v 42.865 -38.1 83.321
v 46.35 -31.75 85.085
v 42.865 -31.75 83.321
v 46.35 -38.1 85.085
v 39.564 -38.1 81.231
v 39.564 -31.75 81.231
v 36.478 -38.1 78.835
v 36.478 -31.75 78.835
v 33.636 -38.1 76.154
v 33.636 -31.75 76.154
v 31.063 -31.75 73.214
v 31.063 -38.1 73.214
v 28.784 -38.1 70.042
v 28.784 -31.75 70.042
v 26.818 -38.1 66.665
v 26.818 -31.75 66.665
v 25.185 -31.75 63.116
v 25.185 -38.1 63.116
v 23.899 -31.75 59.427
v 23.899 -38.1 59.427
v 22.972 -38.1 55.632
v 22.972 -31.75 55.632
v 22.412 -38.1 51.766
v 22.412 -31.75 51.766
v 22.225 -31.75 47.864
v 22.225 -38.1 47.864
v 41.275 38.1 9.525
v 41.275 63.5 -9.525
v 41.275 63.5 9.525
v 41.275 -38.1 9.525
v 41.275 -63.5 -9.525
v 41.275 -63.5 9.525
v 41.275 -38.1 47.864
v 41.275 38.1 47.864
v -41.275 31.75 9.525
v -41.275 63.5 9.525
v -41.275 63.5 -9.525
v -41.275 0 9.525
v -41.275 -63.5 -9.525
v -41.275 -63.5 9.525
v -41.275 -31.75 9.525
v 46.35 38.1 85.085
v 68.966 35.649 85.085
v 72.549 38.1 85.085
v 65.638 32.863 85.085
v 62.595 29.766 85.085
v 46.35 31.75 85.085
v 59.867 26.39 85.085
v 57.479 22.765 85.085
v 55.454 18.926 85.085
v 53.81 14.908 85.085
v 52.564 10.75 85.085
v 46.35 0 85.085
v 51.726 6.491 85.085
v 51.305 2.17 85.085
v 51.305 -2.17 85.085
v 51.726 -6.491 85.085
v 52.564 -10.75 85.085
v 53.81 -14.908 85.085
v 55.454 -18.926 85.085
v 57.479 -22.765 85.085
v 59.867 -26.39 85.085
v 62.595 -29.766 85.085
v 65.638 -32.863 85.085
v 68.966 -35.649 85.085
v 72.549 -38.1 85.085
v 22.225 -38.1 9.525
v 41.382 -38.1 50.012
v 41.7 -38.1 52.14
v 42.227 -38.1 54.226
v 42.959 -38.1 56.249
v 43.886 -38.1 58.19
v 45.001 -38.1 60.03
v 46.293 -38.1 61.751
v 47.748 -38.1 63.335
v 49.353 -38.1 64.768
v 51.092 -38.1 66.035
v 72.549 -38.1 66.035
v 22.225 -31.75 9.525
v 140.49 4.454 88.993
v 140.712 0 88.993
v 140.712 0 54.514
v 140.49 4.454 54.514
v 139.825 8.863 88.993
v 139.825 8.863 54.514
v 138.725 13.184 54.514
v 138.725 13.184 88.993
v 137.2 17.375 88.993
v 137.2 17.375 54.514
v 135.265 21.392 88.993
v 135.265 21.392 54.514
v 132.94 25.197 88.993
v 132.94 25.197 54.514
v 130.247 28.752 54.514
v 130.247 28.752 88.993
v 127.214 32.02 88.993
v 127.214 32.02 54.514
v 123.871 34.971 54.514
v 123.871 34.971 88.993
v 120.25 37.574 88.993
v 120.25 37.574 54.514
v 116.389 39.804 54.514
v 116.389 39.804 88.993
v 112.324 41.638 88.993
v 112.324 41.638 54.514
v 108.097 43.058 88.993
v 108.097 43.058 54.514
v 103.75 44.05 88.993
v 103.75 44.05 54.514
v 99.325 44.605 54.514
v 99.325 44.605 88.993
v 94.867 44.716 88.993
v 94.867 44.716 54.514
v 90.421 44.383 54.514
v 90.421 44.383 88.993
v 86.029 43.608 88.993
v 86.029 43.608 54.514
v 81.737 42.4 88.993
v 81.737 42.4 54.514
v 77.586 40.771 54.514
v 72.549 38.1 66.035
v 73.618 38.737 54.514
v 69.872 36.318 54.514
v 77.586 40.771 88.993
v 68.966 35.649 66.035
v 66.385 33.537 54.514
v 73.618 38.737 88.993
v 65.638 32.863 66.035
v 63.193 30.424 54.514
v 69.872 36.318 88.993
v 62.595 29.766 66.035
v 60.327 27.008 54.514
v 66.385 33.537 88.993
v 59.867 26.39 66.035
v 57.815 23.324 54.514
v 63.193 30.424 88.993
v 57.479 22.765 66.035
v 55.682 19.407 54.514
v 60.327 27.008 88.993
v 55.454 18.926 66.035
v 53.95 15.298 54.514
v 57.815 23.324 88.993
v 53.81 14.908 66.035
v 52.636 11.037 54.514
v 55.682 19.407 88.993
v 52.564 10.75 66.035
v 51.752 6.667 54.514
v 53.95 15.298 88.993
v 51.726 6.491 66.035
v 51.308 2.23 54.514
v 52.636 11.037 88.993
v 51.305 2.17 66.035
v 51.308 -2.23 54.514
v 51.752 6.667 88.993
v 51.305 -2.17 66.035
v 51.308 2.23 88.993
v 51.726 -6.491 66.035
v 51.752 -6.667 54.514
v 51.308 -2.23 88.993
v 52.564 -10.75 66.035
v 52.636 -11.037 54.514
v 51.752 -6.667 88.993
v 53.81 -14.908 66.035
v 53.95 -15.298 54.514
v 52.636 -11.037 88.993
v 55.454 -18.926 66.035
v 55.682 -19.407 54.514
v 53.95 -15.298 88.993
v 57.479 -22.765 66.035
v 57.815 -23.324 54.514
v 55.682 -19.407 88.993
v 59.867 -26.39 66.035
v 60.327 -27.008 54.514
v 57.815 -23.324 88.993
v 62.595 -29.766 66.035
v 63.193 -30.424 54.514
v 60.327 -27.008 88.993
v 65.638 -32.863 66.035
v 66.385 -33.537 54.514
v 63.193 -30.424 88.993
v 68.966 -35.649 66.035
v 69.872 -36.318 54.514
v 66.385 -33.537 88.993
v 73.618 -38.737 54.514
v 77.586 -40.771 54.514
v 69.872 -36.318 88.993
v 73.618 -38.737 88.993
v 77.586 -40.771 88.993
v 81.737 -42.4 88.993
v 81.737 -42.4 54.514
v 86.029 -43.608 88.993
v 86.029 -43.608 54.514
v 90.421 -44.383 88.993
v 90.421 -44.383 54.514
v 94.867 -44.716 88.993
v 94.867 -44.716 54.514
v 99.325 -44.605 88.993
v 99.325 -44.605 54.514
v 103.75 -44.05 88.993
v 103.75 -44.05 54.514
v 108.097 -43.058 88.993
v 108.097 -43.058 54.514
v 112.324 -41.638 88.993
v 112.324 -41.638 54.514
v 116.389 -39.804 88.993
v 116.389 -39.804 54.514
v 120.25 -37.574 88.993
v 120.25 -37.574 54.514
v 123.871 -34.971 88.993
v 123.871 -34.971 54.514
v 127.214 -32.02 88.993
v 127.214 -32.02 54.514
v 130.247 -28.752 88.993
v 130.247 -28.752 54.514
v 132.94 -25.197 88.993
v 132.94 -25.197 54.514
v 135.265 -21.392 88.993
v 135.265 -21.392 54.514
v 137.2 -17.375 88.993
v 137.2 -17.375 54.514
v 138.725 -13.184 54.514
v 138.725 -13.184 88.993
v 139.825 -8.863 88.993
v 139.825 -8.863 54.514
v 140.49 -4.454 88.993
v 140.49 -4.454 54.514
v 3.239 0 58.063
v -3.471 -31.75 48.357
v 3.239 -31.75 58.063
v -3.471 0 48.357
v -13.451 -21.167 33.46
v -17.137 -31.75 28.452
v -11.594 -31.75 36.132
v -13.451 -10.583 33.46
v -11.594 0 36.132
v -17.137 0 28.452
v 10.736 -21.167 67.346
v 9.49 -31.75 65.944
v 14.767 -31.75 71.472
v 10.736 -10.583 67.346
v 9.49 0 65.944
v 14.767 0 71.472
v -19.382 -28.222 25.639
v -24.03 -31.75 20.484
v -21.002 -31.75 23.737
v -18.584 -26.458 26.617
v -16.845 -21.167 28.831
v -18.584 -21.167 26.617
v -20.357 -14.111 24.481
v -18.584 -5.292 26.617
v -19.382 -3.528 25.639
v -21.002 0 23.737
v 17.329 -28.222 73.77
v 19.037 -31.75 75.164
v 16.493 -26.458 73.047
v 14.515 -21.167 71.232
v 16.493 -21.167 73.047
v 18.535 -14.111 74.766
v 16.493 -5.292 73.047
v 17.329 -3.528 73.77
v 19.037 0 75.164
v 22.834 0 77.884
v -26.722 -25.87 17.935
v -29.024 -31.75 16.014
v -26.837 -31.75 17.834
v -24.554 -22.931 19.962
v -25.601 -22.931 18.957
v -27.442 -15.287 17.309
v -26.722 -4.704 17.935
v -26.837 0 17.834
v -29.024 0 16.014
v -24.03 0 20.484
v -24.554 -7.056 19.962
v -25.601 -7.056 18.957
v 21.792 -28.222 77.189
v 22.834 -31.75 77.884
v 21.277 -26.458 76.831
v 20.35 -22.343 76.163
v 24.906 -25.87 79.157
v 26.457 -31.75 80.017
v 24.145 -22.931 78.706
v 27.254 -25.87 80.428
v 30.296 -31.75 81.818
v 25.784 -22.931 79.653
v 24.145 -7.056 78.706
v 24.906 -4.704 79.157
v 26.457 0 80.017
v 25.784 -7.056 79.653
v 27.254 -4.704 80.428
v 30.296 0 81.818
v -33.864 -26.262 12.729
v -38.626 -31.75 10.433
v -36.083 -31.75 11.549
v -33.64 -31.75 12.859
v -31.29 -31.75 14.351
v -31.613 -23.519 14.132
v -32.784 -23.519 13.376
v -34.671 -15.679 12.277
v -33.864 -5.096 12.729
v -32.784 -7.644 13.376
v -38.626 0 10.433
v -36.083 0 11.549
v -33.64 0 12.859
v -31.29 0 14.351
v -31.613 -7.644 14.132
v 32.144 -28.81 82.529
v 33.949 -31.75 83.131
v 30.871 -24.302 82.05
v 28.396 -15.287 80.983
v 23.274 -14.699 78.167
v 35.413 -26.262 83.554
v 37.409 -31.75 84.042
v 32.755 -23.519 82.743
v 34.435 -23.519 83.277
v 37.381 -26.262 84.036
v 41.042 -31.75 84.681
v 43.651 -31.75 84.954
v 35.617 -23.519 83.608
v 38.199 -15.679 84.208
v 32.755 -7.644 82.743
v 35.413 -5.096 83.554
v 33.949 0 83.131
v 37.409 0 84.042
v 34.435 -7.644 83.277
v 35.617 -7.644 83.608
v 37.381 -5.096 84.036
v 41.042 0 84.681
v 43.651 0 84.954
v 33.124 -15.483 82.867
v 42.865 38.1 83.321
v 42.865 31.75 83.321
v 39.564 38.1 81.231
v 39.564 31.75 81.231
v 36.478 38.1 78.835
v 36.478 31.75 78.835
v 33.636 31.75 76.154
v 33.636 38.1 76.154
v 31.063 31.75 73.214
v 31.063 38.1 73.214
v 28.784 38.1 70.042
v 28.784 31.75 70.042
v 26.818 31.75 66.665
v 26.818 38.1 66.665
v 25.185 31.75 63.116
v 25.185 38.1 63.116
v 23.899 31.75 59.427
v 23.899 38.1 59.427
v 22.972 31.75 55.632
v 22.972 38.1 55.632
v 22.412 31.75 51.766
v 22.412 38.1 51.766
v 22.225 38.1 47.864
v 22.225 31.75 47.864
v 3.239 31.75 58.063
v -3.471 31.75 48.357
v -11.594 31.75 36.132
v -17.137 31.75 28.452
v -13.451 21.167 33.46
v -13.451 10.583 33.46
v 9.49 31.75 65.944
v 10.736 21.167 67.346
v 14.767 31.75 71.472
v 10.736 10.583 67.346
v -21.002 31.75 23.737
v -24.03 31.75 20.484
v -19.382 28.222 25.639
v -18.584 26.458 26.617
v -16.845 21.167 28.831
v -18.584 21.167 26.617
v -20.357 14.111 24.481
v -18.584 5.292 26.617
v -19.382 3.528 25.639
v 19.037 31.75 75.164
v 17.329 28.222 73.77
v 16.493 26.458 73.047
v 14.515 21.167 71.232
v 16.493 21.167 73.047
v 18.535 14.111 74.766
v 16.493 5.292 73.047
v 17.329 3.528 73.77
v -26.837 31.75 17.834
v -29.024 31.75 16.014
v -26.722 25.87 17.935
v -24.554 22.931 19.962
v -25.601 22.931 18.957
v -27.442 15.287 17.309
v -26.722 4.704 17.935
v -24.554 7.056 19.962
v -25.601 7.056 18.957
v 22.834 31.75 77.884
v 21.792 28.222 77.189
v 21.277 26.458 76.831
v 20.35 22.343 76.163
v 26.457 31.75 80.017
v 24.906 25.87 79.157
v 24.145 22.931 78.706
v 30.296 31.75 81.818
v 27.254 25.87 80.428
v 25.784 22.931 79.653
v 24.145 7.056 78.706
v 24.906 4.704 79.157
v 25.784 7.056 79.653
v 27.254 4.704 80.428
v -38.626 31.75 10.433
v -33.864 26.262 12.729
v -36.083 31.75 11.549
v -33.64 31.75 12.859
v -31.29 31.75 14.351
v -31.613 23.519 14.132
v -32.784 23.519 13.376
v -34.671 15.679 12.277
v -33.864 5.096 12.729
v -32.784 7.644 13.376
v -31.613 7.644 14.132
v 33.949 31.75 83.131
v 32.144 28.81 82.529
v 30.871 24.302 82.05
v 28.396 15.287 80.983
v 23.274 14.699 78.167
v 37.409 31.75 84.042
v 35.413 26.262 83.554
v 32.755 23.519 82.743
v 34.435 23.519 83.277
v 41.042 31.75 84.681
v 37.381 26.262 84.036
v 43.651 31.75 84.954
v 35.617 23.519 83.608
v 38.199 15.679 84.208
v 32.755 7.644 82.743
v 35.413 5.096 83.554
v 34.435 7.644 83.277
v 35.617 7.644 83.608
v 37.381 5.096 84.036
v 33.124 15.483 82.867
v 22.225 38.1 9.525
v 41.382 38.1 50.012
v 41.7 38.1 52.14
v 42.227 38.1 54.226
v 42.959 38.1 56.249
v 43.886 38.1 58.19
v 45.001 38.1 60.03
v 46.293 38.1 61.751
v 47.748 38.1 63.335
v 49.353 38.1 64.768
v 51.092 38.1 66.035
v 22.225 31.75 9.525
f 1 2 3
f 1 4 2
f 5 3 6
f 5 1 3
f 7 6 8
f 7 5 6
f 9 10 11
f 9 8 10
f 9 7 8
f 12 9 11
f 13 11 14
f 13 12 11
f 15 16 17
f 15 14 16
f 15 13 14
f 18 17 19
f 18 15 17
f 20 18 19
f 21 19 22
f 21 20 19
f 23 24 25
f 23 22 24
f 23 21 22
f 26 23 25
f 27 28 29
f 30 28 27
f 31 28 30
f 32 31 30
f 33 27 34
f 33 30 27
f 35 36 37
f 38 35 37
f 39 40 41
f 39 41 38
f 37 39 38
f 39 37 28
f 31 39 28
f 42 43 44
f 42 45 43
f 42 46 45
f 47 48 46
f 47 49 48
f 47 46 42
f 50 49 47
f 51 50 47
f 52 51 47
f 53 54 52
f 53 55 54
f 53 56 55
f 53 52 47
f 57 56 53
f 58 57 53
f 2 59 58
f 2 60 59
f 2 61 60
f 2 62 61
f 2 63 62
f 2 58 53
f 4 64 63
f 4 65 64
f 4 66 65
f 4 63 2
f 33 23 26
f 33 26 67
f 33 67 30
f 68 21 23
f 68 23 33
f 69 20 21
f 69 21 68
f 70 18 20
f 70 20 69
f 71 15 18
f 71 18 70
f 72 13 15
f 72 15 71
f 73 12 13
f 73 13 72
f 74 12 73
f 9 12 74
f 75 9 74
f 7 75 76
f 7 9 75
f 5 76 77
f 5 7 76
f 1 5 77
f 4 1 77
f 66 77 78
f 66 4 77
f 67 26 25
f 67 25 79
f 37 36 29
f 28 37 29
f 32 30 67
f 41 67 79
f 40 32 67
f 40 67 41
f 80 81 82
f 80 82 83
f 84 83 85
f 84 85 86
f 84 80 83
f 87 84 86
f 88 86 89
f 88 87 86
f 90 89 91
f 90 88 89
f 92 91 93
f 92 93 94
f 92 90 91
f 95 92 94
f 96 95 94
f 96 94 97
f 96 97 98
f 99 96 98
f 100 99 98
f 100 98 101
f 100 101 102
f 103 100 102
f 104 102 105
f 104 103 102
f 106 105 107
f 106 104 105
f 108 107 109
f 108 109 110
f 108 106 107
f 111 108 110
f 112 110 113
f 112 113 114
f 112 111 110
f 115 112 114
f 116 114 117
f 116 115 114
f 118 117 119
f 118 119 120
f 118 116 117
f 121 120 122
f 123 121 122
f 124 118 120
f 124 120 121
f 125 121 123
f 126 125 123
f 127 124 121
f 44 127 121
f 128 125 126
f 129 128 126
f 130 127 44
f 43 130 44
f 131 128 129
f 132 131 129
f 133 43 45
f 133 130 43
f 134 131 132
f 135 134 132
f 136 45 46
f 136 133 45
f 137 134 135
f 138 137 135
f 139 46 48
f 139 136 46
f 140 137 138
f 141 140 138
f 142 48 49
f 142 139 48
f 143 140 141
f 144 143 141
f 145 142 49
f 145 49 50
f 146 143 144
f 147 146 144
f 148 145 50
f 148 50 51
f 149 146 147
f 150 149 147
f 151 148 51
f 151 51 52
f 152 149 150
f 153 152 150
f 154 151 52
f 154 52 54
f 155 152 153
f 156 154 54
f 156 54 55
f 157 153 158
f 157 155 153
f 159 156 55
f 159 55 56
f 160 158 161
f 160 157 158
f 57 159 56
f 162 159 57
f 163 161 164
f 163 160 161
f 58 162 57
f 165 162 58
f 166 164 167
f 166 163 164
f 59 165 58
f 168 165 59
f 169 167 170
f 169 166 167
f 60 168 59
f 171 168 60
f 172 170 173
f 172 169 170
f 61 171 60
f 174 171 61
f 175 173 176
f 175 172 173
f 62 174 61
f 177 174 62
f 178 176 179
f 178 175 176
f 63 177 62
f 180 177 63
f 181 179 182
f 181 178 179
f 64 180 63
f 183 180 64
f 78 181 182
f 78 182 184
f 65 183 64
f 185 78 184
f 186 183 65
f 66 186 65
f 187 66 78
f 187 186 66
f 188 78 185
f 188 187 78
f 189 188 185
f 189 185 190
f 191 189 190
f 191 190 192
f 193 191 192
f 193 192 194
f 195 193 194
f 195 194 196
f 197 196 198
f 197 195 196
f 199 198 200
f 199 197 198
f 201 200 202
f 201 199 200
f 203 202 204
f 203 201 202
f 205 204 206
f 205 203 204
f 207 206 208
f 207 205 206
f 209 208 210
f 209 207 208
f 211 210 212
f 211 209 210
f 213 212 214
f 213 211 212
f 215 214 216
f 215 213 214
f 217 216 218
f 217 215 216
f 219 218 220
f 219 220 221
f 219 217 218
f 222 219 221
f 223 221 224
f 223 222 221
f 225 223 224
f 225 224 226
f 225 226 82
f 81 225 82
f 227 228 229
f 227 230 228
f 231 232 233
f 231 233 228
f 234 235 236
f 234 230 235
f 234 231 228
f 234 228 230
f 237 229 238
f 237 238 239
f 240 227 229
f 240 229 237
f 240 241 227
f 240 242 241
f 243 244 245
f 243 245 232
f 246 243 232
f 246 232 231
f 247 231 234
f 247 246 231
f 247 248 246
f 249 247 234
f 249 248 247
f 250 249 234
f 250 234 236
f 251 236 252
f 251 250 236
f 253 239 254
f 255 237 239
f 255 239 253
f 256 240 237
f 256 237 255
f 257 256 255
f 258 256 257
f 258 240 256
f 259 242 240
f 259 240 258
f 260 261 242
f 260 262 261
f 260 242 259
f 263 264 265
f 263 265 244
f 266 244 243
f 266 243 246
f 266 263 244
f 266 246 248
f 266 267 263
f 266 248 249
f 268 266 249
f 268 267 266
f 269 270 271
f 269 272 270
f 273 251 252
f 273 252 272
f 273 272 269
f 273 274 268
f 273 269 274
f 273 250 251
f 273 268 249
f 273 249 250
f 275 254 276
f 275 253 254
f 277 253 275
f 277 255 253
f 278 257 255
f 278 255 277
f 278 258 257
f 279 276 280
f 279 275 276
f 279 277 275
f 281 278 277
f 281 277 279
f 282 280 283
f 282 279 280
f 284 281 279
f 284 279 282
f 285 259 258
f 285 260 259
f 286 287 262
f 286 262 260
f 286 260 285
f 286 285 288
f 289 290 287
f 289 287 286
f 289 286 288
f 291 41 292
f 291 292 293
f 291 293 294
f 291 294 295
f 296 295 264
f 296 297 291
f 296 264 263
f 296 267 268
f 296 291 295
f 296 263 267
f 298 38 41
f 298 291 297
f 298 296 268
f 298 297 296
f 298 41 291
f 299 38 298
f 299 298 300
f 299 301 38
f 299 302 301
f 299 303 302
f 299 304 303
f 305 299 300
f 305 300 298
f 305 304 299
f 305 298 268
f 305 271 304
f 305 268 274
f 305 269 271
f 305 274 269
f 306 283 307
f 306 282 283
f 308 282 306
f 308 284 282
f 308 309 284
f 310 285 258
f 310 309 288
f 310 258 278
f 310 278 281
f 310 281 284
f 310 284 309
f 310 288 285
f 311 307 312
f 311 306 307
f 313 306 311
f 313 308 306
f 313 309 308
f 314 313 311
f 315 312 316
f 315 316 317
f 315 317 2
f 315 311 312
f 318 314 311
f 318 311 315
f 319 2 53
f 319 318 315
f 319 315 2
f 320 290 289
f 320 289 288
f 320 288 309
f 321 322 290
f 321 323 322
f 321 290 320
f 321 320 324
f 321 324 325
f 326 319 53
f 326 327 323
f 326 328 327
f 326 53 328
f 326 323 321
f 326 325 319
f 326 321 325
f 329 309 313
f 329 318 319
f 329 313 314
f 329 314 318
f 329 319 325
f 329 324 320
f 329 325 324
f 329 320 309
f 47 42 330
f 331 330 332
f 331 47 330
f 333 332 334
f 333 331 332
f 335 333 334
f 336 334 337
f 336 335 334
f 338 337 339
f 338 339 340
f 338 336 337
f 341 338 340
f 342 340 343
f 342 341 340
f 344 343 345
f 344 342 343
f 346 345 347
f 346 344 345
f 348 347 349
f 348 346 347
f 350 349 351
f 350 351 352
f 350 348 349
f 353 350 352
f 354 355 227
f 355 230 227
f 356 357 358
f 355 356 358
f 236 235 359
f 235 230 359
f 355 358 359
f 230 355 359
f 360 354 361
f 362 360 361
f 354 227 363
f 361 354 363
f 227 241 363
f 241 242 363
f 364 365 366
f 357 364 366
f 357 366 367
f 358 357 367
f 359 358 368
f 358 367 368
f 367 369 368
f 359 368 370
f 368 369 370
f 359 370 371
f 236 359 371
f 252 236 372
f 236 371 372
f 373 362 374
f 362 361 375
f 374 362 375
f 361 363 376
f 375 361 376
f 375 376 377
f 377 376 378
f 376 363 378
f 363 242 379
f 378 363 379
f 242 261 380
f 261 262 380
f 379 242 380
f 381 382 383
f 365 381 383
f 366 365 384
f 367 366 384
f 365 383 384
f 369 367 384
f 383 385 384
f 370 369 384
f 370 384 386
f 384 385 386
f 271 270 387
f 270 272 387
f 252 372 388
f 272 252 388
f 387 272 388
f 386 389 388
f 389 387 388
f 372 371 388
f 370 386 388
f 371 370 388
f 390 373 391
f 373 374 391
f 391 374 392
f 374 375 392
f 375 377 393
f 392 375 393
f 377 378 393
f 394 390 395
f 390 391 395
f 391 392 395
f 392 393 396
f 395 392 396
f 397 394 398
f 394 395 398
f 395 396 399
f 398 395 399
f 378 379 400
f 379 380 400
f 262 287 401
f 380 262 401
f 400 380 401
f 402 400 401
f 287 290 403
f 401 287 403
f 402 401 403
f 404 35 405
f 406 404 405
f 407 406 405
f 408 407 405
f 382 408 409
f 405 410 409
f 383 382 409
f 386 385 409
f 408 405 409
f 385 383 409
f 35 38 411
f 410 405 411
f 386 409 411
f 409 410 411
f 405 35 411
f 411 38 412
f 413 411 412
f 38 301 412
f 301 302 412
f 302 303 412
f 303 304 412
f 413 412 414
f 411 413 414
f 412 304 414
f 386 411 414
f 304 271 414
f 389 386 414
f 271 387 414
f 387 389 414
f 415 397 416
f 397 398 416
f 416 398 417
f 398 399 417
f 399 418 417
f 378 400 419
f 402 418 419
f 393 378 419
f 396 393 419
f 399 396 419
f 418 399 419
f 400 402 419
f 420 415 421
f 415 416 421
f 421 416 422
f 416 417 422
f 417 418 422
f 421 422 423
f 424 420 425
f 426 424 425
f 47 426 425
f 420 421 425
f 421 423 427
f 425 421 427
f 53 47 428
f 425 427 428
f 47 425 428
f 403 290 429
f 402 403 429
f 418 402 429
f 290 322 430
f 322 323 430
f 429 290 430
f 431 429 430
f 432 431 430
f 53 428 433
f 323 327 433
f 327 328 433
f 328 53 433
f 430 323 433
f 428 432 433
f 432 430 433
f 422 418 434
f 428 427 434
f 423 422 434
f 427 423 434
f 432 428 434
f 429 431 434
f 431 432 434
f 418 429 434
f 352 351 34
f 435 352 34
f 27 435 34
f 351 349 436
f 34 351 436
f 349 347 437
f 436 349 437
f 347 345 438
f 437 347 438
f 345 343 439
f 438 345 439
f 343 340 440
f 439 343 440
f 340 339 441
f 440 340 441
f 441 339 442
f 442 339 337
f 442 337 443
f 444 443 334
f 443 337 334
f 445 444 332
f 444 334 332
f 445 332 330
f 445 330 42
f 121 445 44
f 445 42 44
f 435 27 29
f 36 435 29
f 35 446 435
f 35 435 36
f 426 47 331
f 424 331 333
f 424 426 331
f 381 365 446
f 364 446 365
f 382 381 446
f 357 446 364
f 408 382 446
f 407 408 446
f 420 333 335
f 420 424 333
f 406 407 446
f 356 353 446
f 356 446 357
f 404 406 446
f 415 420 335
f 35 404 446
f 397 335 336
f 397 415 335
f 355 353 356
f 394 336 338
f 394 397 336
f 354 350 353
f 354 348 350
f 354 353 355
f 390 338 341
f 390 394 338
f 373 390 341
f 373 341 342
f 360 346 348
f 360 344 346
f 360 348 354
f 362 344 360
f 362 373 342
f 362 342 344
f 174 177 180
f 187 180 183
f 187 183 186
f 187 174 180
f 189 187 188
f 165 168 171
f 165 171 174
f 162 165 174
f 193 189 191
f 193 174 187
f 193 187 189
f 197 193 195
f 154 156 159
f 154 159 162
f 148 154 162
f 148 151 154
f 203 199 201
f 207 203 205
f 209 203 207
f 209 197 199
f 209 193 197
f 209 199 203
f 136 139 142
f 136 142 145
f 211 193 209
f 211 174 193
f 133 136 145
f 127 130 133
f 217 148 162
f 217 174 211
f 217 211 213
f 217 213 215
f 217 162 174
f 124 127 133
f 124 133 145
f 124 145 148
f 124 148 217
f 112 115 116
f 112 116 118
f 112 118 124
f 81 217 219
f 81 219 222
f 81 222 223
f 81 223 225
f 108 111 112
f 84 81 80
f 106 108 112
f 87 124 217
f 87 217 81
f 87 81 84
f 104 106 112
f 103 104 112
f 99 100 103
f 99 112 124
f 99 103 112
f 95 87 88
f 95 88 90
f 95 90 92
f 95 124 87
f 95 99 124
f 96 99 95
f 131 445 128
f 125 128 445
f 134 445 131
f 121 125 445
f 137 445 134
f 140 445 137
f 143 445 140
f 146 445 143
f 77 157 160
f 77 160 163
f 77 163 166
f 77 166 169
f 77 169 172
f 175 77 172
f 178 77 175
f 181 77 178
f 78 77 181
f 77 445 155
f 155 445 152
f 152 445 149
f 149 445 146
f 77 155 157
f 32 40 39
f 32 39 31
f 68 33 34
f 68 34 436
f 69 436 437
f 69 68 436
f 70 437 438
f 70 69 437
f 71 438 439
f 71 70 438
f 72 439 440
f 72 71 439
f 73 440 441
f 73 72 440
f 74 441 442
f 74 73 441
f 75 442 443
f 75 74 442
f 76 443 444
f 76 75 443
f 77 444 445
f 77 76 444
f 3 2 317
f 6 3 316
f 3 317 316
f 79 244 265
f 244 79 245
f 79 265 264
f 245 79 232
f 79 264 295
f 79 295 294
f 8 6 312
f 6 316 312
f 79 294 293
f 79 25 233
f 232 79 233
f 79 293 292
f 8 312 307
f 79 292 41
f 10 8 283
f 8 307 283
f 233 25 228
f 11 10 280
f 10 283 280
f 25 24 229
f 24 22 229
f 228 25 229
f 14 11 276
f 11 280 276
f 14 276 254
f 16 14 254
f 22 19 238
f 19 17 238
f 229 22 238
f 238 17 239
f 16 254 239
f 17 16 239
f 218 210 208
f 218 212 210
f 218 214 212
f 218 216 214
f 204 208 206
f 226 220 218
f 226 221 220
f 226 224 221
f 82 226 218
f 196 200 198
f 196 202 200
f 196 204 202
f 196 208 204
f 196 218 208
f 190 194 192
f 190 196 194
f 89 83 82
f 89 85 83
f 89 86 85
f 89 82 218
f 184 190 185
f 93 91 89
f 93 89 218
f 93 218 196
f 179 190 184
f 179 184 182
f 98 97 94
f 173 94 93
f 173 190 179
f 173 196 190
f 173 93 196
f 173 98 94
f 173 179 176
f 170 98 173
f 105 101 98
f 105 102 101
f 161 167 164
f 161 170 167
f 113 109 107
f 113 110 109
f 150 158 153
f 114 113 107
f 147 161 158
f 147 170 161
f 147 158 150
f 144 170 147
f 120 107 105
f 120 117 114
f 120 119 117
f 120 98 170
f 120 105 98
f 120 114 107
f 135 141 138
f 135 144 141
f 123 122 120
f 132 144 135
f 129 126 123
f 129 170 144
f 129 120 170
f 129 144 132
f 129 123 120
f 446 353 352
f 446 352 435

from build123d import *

# Parameters (mm, degrees)
F1_DEPTH = 63.5
F2_DEPTH = 38.1
F3_DEPTH = 31.75


with BuildPart() as f1:
    # F0 (on Front) → F1 (new body, symmetric)
    with BuildSketch(Plane.XZ):
        Polygon((22.225, 9.525), (-41.275, 9.525), (-41.275, -9.525), (41.275, -9.525), (41.275, 9.525), align=None)
    extrude(amount=F1_DEPTH, both=True)

    # F0 (on Front) → F2 (join, symmetric)
    with BuildSketch(Plane.XZ):
        with BuildLine():
            Line((22.225, 47.863565), (22.225, 9.525))
            Line((22.225, 9.525), (41.275, 9.525))
            Line((41.275, 9.525), (41.275, 47.863565))
            ThreePointArc((41.275, 47.863565), (43.886262, 58.190434), (51.092341, 66.034881))
            Line((51.092341, 66.034881), (95.982485, 66.034881))
            Line((95.982485, 66.034881), (95.982485, 85.084881))
            Line((95.982485, 85.084881), (46.350457, 85.084881))
            ThreePointArc((46.350457, 85.084881), (28.783869, 70.041618), (22.225, 47.863565))
        make_face()
    extrude(amount=F2_DEPTH, both=True)

    # F0 (on Front) → F3 (join, symmetric)
    with BuildSketch(Plane.XZ):
        with BuildLine():
            add(Edge.make_bspline(
                [(-41.275, 9.525), (-6.610331, 19.785214), (0, 84.11859), (46.350457, 85.084881)],
                knots=[0, 0, 0, 0, 115.704435, 115.704435, 115.704435, 115.704435], degree=3))
            Line((-41.275, 9.525), (22.225, 9.525))
            Line((22.225, 9.525), (22.225, 47.863565))
            ThreePointArc((22.225, 47.863565), (28.783869, 70.041618), (46.350457, 85.084881))
        make_face()
    extrude(amount=F3_DEPTH, both=True)

    # F0 (on Front) → F4 (revolve)
    with BuildSketch(Plane.XZ):
        Polygon((95.982485, 88.993471), (95.982485, 85.084881), (95.982485, 66.034881), (95.982485, 54.514322), (140.712164, 54.514322), (140.712164, 88.993471), align=None)
    revolve(axis=Axis((95.982485, 0, 71.753897), (0, 0, 1)))


solid = f1.part
